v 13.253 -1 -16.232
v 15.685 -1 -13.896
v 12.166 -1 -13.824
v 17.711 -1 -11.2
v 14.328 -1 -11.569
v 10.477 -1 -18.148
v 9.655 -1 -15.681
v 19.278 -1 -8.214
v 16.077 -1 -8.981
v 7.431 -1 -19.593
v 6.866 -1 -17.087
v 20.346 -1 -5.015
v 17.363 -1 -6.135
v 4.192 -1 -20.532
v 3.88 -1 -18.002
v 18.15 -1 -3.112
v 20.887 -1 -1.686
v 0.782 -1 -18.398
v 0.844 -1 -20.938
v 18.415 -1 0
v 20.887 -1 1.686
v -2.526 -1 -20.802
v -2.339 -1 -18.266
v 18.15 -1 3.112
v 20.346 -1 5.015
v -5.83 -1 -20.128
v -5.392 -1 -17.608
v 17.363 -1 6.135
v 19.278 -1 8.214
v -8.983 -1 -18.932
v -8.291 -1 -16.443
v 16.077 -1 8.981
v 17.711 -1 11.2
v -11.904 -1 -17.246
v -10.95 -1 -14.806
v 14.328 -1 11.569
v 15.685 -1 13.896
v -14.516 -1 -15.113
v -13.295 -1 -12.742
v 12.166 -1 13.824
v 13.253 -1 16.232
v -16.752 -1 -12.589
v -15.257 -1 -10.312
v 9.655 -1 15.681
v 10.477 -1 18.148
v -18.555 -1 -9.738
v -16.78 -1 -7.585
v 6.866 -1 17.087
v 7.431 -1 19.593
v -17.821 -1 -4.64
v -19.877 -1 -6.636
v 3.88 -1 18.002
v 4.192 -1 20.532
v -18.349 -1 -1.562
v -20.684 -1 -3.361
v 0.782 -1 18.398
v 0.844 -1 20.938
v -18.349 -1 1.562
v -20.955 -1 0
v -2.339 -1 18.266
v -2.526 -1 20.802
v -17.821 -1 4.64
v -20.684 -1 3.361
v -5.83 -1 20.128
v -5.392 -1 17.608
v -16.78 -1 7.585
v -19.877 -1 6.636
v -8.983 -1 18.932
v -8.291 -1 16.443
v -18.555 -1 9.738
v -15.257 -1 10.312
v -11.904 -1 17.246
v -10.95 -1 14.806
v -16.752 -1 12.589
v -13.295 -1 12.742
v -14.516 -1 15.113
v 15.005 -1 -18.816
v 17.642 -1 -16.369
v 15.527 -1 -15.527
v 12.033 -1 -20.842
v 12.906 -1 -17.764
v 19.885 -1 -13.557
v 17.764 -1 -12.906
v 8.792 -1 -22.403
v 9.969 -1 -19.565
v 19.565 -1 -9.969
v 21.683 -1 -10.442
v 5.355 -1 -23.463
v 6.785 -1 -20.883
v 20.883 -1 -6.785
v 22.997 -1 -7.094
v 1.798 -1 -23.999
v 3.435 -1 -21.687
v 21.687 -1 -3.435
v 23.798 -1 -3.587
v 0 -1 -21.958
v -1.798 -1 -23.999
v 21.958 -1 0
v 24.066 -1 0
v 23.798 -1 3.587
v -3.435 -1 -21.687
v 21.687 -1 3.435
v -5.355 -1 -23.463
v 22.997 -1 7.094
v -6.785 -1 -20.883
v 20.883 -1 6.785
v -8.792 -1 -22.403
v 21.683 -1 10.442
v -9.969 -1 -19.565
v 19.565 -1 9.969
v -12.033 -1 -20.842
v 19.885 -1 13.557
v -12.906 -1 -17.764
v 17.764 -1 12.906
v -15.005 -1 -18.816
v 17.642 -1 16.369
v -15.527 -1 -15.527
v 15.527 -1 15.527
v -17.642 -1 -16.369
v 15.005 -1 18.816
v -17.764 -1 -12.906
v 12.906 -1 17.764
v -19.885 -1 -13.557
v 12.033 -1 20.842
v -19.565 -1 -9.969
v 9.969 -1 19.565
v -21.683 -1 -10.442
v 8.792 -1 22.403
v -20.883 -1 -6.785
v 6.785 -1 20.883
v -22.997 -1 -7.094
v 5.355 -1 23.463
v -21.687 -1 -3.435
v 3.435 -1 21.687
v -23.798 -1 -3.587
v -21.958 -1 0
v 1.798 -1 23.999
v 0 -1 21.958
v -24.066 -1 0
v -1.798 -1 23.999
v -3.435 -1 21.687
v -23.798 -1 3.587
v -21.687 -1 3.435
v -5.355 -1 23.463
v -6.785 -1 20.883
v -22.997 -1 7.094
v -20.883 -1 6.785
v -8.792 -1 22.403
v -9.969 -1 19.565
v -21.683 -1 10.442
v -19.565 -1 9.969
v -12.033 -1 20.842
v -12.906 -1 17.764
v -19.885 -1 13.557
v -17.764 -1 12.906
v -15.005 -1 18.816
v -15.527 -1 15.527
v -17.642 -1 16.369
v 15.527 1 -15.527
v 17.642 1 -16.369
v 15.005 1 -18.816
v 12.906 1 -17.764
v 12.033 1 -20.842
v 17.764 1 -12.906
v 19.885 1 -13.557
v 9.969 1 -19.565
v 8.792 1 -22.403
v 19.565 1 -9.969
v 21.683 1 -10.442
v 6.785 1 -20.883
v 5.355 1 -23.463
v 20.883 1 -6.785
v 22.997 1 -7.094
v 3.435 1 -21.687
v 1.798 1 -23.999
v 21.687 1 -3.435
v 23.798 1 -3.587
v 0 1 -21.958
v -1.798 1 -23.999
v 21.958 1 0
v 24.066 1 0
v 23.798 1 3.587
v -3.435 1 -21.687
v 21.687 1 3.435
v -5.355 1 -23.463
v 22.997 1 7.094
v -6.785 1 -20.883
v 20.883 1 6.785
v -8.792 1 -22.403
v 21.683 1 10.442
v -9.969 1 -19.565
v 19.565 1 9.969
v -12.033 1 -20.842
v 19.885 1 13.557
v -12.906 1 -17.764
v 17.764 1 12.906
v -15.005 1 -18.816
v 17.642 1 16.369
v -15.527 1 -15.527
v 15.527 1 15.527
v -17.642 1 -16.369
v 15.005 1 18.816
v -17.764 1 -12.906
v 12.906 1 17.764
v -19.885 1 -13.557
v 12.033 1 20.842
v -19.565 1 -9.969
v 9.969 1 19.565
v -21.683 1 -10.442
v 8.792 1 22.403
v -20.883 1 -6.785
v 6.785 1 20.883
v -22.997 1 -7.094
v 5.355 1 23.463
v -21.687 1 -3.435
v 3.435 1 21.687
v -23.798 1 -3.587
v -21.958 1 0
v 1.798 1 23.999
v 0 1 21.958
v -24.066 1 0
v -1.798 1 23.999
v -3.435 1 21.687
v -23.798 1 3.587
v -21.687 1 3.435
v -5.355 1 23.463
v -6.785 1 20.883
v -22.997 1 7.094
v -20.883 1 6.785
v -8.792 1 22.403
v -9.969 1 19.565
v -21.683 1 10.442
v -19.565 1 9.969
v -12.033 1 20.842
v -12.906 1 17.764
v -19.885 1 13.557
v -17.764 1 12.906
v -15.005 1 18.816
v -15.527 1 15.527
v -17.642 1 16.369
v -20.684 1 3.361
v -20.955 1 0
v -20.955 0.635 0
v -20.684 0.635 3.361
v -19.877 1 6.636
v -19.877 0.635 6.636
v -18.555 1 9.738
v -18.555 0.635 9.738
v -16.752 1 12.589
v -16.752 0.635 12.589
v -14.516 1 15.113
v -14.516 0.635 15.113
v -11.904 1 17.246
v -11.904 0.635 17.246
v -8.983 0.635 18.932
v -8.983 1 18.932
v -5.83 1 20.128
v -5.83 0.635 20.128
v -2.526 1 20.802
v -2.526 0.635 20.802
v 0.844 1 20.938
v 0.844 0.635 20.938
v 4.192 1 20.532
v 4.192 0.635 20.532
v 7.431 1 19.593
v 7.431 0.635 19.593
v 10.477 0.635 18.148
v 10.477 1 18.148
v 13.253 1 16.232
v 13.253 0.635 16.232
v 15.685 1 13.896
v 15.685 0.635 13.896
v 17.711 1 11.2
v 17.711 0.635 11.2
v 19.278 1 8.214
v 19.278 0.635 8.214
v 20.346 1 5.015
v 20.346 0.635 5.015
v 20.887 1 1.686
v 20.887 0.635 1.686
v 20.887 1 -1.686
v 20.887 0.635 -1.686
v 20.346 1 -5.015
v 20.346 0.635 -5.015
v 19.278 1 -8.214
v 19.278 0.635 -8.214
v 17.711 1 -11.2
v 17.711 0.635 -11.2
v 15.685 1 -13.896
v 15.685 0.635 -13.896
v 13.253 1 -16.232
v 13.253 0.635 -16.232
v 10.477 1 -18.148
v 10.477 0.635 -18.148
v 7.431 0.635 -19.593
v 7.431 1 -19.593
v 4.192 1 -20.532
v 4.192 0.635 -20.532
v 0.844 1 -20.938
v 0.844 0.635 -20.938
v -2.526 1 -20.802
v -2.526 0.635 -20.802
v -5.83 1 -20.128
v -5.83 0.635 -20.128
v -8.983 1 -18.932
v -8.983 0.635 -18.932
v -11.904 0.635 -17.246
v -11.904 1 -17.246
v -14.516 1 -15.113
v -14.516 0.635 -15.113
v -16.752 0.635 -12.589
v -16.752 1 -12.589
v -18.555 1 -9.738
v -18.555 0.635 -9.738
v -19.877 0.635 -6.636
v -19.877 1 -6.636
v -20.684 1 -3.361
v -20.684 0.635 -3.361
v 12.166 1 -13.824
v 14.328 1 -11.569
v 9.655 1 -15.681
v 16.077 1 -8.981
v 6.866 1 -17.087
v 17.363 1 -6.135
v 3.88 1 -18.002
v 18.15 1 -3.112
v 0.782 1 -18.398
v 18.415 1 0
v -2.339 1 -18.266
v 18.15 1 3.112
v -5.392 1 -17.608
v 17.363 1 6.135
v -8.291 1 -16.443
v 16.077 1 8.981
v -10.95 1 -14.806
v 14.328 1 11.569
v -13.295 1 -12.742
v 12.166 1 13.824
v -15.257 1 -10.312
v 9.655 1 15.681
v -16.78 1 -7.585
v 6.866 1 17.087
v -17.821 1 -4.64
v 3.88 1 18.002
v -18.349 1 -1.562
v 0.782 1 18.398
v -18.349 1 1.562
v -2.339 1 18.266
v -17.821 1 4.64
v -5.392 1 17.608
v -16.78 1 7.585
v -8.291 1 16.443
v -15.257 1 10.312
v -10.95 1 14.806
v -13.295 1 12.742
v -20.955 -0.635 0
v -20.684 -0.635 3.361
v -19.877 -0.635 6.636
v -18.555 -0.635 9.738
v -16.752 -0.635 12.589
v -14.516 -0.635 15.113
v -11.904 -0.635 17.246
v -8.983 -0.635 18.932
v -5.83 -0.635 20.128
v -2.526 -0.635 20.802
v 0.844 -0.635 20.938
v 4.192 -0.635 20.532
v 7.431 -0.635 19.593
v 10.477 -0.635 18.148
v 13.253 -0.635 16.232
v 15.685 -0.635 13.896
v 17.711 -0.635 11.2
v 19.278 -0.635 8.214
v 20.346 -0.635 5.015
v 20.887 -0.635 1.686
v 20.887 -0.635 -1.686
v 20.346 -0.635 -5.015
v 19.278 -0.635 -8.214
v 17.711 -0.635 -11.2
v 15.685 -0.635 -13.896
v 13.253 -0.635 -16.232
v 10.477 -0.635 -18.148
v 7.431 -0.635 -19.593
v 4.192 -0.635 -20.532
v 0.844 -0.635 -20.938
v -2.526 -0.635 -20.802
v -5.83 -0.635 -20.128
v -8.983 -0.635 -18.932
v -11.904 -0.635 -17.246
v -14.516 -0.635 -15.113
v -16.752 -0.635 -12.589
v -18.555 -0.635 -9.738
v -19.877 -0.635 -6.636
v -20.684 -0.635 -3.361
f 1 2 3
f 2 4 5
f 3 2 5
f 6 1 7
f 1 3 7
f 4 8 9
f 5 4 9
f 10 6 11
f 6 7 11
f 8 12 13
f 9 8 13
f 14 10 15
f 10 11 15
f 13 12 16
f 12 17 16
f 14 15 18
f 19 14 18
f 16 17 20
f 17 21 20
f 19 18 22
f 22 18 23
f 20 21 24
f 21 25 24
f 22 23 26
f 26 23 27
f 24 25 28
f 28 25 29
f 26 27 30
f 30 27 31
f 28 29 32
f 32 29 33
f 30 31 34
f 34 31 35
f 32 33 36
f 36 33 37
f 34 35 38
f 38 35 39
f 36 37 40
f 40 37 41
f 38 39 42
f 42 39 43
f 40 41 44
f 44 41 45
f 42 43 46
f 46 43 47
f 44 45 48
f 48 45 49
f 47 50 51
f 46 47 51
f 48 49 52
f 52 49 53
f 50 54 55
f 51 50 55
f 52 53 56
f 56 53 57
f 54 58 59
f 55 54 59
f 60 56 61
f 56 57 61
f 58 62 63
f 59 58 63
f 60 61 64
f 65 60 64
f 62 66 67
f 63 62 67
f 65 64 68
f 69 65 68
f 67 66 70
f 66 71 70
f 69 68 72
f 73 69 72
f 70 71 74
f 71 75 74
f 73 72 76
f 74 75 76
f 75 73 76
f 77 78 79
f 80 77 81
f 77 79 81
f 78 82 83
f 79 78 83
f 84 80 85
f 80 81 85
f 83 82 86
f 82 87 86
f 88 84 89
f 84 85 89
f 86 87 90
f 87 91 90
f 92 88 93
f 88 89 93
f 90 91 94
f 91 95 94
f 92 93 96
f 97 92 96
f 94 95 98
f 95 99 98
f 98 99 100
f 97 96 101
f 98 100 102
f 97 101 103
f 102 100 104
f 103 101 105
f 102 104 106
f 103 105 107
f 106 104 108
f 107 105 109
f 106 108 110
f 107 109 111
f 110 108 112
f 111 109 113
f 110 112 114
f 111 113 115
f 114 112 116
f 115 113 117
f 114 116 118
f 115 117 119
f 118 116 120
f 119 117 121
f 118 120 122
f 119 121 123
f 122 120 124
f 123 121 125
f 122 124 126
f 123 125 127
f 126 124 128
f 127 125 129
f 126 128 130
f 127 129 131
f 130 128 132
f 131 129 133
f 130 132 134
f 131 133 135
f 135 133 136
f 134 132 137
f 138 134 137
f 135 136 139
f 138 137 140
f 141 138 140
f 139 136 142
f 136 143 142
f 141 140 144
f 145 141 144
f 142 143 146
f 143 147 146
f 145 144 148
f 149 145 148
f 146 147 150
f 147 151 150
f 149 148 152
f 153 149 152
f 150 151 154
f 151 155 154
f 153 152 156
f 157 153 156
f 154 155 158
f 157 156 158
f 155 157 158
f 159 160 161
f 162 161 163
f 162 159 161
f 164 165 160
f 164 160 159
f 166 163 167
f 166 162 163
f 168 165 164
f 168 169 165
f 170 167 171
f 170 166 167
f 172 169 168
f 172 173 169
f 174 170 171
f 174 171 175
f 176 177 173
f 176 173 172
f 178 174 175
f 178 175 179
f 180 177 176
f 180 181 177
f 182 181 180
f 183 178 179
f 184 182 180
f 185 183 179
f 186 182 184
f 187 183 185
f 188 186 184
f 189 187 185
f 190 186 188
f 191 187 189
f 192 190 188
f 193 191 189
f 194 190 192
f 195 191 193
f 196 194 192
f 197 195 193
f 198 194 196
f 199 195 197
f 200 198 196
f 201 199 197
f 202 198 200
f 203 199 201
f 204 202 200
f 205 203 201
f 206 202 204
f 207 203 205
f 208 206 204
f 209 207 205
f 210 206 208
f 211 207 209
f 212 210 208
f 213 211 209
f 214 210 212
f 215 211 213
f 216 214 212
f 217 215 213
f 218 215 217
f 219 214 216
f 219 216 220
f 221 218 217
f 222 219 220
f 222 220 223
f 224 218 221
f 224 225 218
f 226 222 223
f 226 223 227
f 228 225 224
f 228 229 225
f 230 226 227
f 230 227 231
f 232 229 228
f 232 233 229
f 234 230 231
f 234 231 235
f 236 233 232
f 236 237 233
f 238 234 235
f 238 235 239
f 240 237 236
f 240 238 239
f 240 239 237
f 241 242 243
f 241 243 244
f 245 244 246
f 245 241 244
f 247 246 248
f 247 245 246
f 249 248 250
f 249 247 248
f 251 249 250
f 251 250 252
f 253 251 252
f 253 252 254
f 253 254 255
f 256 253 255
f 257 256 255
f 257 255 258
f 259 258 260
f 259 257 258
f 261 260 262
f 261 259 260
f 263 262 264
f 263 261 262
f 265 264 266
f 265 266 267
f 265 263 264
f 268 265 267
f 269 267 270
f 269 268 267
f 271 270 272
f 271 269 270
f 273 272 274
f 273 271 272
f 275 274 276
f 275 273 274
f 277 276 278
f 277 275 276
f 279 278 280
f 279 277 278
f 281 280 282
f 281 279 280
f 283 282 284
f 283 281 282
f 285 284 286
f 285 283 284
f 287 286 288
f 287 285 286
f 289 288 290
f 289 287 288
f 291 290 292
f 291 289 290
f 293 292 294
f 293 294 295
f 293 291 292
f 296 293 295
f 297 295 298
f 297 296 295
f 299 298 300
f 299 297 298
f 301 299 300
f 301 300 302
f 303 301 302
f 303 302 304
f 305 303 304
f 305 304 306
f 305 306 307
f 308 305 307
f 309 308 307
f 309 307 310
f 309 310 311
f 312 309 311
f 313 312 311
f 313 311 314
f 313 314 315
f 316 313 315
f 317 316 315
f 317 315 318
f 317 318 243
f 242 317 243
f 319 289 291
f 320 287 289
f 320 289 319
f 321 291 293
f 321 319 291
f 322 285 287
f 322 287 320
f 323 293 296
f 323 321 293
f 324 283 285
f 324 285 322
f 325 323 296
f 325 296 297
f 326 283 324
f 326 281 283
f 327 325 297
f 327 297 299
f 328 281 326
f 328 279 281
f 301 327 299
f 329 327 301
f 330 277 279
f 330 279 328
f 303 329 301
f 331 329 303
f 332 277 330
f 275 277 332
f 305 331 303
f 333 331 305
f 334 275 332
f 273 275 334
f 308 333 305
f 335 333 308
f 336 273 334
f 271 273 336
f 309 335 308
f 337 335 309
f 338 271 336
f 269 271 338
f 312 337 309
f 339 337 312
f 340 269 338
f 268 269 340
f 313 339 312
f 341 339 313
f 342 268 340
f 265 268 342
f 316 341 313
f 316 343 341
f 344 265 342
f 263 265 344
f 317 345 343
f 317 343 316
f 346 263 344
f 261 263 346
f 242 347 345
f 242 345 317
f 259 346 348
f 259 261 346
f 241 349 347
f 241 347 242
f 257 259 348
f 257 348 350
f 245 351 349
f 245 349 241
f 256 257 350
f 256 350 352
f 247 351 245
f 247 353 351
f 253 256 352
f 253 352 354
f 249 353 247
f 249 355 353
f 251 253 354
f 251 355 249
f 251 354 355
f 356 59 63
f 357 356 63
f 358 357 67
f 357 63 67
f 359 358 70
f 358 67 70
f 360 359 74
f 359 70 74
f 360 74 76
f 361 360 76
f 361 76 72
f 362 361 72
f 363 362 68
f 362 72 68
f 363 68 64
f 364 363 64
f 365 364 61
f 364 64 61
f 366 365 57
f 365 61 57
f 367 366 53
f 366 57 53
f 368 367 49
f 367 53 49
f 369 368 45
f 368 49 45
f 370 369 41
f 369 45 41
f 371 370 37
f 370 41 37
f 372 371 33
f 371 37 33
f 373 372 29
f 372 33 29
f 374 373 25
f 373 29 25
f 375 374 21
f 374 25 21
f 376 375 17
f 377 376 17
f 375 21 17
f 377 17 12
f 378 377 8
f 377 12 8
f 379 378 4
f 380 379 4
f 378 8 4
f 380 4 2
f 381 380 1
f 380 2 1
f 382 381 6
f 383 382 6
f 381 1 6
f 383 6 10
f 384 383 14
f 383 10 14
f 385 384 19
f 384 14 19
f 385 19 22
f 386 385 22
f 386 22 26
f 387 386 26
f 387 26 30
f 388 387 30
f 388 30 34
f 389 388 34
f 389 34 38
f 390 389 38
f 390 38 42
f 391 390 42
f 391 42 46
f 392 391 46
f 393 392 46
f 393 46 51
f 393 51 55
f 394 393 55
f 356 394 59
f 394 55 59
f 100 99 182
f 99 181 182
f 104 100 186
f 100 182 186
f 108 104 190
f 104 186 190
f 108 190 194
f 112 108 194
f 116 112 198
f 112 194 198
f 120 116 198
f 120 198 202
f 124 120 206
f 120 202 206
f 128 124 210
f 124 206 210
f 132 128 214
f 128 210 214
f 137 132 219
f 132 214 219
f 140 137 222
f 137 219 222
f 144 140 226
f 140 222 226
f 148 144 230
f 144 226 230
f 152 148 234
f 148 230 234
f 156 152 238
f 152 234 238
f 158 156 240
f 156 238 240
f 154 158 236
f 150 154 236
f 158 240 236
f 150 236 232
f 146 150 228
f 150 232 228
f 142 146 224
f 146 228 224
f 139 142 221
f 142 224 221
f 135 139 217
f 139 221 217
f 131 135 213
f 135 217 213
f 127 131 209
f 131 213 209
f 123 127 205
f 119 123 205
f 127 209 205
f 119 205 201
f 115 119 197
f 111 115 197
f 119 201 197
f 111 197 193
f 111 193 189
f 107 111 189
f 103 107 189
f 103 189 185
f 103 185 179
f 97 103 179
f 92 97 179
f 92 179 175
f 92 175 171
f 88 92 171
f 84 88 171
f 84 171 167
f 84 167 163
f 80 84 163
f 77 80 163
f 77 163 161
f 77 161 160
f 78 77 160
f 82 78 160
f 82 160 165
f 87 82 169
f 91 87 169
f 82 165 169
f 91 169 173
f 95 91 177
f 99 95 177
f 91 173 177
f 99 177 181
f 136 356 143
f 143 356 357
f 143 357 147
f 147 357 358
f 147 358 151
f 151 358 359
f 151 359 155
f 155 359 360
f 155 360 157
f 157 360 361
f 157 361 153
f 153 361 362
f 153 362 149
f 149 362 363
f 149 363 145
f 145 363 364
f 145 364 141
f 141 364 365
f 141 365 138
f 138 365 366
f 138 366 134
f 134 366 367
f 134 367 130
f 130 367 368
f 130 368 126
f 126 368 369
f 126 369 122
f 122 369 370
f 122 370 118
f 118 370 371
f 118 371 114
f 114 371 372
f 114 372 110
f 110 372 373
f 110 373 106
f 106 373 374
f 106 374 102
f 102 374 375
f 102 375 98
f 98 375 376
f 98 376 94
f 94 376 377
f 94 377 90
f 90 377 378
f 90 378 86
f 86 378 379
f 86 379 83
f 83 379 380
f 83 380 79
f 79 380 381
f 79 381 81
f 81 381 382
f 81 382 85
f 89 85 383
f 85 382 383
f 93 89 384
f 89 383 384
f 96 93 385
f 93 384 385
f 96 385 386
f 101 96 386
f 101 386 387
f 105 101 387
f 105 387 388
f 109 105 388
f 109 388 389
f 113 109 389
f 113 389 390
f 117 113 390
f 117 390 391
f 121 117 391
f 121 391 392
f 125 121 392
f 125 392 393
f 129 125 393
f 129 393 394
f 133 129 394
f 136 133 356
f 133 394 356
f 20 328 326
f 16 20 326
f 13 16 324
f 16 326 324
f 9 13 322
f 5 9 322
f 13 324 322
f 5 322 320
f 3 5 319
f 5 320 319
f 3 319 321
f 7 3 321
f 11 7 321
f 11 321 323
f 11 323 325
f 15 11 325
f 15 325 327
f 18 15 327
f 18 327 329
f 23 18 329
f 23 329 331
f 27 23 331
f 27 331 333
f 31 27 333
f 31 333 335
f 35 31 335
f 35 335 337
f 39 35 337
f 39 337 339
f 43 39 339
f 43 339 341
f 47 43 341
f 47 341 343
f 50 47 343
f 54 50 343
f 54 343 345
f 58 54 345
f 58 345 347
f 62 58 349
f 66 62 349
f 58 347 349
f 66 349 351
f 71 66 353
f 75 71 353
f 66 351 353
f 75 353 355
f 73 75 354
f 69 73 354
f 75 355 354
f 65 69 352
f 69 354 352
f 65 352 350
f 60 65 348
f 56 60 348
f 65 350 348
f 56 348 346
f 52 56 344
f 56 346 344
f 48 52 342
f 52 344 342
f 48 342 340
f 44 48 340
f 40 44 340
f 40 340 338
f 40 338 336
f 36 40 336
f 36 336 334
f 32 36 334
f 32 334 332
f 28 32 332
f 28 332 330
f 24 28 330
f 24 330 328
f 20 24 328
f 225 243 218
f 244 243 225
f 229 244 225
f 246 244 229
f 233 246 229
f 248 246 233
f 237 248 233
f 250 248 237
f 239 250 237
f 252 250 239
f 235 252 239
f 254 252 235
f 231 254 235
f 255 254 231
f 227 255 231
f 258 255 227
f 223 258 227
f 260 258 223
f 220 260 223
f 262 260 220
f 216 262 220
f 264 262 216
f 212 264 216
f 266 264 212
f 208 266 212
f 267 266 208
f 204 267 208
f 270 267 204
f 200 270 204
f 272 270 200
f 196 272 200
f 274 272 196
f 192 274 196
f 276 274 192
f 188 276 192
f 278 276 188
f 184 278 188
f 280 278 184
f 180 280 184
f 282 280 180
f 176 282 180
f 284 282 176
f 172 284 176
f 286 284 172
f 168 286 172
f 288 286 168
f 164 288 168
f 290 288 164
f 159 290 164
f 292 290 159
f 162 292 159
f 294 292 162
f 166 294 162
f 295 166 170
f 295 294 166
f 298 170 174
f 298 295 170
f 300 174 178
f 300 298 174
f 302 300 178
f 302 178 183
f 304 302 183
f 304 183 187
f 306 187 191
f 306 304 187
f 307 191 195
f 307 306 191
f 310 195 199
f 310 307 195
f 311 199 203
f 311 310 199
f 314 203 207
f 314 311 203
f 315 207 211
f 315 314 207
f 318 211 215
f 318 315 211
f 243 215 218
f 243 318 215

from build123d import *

# Parameters (mm, degrees)
SKETCH1_W          = 24.0665
SKETCH1_H          = 1.999996
SKETCH3_R          = 18.415
CUT_EXTRUDE1_DEPTH = 2.999996


with BuildPart() as part:
    # Sketch1 → Revolve1 (revolve)
    with BuildSketch(Plane.XY):
        with Locations((12.03325, 0)):
            Rectangle(SKETCH1_W, SKETCH1_H)
    revolve(axis=Axis((0, 0.999998, 0), (0, -1, 0)))

    # Sketch2 → Cut-Revolve1 (revolve, cut)
    with BuildSketch(Plane.XY):
        Polygon((-20.955, 0.635), (-20.955, 1.799850338), (-24.1554, 1.799850338), align=None)
        Polygon((-24.1554, -1.799850338), (-20.955, -0.635), (-20.955, -1.799850338), align=None)
    revolve(axis=Axis((0, 0, 0), (0, 1, 0)), mode=Mode.SUBTRACT)

    # Sketch3 → Cut-Extrude1 (cut, through all)
    with BuildSketch(Plane(origin=(0, 0.999998, 0), x_dir=(1, 0, 0), z_dir=(0, 1, 0))):
        Circle(SKETCH3_R)
    extrude(amount=-CUT_EXTRUDE1_DEPTH, mode=Mode.SUBTRACT)


solid = part.part
